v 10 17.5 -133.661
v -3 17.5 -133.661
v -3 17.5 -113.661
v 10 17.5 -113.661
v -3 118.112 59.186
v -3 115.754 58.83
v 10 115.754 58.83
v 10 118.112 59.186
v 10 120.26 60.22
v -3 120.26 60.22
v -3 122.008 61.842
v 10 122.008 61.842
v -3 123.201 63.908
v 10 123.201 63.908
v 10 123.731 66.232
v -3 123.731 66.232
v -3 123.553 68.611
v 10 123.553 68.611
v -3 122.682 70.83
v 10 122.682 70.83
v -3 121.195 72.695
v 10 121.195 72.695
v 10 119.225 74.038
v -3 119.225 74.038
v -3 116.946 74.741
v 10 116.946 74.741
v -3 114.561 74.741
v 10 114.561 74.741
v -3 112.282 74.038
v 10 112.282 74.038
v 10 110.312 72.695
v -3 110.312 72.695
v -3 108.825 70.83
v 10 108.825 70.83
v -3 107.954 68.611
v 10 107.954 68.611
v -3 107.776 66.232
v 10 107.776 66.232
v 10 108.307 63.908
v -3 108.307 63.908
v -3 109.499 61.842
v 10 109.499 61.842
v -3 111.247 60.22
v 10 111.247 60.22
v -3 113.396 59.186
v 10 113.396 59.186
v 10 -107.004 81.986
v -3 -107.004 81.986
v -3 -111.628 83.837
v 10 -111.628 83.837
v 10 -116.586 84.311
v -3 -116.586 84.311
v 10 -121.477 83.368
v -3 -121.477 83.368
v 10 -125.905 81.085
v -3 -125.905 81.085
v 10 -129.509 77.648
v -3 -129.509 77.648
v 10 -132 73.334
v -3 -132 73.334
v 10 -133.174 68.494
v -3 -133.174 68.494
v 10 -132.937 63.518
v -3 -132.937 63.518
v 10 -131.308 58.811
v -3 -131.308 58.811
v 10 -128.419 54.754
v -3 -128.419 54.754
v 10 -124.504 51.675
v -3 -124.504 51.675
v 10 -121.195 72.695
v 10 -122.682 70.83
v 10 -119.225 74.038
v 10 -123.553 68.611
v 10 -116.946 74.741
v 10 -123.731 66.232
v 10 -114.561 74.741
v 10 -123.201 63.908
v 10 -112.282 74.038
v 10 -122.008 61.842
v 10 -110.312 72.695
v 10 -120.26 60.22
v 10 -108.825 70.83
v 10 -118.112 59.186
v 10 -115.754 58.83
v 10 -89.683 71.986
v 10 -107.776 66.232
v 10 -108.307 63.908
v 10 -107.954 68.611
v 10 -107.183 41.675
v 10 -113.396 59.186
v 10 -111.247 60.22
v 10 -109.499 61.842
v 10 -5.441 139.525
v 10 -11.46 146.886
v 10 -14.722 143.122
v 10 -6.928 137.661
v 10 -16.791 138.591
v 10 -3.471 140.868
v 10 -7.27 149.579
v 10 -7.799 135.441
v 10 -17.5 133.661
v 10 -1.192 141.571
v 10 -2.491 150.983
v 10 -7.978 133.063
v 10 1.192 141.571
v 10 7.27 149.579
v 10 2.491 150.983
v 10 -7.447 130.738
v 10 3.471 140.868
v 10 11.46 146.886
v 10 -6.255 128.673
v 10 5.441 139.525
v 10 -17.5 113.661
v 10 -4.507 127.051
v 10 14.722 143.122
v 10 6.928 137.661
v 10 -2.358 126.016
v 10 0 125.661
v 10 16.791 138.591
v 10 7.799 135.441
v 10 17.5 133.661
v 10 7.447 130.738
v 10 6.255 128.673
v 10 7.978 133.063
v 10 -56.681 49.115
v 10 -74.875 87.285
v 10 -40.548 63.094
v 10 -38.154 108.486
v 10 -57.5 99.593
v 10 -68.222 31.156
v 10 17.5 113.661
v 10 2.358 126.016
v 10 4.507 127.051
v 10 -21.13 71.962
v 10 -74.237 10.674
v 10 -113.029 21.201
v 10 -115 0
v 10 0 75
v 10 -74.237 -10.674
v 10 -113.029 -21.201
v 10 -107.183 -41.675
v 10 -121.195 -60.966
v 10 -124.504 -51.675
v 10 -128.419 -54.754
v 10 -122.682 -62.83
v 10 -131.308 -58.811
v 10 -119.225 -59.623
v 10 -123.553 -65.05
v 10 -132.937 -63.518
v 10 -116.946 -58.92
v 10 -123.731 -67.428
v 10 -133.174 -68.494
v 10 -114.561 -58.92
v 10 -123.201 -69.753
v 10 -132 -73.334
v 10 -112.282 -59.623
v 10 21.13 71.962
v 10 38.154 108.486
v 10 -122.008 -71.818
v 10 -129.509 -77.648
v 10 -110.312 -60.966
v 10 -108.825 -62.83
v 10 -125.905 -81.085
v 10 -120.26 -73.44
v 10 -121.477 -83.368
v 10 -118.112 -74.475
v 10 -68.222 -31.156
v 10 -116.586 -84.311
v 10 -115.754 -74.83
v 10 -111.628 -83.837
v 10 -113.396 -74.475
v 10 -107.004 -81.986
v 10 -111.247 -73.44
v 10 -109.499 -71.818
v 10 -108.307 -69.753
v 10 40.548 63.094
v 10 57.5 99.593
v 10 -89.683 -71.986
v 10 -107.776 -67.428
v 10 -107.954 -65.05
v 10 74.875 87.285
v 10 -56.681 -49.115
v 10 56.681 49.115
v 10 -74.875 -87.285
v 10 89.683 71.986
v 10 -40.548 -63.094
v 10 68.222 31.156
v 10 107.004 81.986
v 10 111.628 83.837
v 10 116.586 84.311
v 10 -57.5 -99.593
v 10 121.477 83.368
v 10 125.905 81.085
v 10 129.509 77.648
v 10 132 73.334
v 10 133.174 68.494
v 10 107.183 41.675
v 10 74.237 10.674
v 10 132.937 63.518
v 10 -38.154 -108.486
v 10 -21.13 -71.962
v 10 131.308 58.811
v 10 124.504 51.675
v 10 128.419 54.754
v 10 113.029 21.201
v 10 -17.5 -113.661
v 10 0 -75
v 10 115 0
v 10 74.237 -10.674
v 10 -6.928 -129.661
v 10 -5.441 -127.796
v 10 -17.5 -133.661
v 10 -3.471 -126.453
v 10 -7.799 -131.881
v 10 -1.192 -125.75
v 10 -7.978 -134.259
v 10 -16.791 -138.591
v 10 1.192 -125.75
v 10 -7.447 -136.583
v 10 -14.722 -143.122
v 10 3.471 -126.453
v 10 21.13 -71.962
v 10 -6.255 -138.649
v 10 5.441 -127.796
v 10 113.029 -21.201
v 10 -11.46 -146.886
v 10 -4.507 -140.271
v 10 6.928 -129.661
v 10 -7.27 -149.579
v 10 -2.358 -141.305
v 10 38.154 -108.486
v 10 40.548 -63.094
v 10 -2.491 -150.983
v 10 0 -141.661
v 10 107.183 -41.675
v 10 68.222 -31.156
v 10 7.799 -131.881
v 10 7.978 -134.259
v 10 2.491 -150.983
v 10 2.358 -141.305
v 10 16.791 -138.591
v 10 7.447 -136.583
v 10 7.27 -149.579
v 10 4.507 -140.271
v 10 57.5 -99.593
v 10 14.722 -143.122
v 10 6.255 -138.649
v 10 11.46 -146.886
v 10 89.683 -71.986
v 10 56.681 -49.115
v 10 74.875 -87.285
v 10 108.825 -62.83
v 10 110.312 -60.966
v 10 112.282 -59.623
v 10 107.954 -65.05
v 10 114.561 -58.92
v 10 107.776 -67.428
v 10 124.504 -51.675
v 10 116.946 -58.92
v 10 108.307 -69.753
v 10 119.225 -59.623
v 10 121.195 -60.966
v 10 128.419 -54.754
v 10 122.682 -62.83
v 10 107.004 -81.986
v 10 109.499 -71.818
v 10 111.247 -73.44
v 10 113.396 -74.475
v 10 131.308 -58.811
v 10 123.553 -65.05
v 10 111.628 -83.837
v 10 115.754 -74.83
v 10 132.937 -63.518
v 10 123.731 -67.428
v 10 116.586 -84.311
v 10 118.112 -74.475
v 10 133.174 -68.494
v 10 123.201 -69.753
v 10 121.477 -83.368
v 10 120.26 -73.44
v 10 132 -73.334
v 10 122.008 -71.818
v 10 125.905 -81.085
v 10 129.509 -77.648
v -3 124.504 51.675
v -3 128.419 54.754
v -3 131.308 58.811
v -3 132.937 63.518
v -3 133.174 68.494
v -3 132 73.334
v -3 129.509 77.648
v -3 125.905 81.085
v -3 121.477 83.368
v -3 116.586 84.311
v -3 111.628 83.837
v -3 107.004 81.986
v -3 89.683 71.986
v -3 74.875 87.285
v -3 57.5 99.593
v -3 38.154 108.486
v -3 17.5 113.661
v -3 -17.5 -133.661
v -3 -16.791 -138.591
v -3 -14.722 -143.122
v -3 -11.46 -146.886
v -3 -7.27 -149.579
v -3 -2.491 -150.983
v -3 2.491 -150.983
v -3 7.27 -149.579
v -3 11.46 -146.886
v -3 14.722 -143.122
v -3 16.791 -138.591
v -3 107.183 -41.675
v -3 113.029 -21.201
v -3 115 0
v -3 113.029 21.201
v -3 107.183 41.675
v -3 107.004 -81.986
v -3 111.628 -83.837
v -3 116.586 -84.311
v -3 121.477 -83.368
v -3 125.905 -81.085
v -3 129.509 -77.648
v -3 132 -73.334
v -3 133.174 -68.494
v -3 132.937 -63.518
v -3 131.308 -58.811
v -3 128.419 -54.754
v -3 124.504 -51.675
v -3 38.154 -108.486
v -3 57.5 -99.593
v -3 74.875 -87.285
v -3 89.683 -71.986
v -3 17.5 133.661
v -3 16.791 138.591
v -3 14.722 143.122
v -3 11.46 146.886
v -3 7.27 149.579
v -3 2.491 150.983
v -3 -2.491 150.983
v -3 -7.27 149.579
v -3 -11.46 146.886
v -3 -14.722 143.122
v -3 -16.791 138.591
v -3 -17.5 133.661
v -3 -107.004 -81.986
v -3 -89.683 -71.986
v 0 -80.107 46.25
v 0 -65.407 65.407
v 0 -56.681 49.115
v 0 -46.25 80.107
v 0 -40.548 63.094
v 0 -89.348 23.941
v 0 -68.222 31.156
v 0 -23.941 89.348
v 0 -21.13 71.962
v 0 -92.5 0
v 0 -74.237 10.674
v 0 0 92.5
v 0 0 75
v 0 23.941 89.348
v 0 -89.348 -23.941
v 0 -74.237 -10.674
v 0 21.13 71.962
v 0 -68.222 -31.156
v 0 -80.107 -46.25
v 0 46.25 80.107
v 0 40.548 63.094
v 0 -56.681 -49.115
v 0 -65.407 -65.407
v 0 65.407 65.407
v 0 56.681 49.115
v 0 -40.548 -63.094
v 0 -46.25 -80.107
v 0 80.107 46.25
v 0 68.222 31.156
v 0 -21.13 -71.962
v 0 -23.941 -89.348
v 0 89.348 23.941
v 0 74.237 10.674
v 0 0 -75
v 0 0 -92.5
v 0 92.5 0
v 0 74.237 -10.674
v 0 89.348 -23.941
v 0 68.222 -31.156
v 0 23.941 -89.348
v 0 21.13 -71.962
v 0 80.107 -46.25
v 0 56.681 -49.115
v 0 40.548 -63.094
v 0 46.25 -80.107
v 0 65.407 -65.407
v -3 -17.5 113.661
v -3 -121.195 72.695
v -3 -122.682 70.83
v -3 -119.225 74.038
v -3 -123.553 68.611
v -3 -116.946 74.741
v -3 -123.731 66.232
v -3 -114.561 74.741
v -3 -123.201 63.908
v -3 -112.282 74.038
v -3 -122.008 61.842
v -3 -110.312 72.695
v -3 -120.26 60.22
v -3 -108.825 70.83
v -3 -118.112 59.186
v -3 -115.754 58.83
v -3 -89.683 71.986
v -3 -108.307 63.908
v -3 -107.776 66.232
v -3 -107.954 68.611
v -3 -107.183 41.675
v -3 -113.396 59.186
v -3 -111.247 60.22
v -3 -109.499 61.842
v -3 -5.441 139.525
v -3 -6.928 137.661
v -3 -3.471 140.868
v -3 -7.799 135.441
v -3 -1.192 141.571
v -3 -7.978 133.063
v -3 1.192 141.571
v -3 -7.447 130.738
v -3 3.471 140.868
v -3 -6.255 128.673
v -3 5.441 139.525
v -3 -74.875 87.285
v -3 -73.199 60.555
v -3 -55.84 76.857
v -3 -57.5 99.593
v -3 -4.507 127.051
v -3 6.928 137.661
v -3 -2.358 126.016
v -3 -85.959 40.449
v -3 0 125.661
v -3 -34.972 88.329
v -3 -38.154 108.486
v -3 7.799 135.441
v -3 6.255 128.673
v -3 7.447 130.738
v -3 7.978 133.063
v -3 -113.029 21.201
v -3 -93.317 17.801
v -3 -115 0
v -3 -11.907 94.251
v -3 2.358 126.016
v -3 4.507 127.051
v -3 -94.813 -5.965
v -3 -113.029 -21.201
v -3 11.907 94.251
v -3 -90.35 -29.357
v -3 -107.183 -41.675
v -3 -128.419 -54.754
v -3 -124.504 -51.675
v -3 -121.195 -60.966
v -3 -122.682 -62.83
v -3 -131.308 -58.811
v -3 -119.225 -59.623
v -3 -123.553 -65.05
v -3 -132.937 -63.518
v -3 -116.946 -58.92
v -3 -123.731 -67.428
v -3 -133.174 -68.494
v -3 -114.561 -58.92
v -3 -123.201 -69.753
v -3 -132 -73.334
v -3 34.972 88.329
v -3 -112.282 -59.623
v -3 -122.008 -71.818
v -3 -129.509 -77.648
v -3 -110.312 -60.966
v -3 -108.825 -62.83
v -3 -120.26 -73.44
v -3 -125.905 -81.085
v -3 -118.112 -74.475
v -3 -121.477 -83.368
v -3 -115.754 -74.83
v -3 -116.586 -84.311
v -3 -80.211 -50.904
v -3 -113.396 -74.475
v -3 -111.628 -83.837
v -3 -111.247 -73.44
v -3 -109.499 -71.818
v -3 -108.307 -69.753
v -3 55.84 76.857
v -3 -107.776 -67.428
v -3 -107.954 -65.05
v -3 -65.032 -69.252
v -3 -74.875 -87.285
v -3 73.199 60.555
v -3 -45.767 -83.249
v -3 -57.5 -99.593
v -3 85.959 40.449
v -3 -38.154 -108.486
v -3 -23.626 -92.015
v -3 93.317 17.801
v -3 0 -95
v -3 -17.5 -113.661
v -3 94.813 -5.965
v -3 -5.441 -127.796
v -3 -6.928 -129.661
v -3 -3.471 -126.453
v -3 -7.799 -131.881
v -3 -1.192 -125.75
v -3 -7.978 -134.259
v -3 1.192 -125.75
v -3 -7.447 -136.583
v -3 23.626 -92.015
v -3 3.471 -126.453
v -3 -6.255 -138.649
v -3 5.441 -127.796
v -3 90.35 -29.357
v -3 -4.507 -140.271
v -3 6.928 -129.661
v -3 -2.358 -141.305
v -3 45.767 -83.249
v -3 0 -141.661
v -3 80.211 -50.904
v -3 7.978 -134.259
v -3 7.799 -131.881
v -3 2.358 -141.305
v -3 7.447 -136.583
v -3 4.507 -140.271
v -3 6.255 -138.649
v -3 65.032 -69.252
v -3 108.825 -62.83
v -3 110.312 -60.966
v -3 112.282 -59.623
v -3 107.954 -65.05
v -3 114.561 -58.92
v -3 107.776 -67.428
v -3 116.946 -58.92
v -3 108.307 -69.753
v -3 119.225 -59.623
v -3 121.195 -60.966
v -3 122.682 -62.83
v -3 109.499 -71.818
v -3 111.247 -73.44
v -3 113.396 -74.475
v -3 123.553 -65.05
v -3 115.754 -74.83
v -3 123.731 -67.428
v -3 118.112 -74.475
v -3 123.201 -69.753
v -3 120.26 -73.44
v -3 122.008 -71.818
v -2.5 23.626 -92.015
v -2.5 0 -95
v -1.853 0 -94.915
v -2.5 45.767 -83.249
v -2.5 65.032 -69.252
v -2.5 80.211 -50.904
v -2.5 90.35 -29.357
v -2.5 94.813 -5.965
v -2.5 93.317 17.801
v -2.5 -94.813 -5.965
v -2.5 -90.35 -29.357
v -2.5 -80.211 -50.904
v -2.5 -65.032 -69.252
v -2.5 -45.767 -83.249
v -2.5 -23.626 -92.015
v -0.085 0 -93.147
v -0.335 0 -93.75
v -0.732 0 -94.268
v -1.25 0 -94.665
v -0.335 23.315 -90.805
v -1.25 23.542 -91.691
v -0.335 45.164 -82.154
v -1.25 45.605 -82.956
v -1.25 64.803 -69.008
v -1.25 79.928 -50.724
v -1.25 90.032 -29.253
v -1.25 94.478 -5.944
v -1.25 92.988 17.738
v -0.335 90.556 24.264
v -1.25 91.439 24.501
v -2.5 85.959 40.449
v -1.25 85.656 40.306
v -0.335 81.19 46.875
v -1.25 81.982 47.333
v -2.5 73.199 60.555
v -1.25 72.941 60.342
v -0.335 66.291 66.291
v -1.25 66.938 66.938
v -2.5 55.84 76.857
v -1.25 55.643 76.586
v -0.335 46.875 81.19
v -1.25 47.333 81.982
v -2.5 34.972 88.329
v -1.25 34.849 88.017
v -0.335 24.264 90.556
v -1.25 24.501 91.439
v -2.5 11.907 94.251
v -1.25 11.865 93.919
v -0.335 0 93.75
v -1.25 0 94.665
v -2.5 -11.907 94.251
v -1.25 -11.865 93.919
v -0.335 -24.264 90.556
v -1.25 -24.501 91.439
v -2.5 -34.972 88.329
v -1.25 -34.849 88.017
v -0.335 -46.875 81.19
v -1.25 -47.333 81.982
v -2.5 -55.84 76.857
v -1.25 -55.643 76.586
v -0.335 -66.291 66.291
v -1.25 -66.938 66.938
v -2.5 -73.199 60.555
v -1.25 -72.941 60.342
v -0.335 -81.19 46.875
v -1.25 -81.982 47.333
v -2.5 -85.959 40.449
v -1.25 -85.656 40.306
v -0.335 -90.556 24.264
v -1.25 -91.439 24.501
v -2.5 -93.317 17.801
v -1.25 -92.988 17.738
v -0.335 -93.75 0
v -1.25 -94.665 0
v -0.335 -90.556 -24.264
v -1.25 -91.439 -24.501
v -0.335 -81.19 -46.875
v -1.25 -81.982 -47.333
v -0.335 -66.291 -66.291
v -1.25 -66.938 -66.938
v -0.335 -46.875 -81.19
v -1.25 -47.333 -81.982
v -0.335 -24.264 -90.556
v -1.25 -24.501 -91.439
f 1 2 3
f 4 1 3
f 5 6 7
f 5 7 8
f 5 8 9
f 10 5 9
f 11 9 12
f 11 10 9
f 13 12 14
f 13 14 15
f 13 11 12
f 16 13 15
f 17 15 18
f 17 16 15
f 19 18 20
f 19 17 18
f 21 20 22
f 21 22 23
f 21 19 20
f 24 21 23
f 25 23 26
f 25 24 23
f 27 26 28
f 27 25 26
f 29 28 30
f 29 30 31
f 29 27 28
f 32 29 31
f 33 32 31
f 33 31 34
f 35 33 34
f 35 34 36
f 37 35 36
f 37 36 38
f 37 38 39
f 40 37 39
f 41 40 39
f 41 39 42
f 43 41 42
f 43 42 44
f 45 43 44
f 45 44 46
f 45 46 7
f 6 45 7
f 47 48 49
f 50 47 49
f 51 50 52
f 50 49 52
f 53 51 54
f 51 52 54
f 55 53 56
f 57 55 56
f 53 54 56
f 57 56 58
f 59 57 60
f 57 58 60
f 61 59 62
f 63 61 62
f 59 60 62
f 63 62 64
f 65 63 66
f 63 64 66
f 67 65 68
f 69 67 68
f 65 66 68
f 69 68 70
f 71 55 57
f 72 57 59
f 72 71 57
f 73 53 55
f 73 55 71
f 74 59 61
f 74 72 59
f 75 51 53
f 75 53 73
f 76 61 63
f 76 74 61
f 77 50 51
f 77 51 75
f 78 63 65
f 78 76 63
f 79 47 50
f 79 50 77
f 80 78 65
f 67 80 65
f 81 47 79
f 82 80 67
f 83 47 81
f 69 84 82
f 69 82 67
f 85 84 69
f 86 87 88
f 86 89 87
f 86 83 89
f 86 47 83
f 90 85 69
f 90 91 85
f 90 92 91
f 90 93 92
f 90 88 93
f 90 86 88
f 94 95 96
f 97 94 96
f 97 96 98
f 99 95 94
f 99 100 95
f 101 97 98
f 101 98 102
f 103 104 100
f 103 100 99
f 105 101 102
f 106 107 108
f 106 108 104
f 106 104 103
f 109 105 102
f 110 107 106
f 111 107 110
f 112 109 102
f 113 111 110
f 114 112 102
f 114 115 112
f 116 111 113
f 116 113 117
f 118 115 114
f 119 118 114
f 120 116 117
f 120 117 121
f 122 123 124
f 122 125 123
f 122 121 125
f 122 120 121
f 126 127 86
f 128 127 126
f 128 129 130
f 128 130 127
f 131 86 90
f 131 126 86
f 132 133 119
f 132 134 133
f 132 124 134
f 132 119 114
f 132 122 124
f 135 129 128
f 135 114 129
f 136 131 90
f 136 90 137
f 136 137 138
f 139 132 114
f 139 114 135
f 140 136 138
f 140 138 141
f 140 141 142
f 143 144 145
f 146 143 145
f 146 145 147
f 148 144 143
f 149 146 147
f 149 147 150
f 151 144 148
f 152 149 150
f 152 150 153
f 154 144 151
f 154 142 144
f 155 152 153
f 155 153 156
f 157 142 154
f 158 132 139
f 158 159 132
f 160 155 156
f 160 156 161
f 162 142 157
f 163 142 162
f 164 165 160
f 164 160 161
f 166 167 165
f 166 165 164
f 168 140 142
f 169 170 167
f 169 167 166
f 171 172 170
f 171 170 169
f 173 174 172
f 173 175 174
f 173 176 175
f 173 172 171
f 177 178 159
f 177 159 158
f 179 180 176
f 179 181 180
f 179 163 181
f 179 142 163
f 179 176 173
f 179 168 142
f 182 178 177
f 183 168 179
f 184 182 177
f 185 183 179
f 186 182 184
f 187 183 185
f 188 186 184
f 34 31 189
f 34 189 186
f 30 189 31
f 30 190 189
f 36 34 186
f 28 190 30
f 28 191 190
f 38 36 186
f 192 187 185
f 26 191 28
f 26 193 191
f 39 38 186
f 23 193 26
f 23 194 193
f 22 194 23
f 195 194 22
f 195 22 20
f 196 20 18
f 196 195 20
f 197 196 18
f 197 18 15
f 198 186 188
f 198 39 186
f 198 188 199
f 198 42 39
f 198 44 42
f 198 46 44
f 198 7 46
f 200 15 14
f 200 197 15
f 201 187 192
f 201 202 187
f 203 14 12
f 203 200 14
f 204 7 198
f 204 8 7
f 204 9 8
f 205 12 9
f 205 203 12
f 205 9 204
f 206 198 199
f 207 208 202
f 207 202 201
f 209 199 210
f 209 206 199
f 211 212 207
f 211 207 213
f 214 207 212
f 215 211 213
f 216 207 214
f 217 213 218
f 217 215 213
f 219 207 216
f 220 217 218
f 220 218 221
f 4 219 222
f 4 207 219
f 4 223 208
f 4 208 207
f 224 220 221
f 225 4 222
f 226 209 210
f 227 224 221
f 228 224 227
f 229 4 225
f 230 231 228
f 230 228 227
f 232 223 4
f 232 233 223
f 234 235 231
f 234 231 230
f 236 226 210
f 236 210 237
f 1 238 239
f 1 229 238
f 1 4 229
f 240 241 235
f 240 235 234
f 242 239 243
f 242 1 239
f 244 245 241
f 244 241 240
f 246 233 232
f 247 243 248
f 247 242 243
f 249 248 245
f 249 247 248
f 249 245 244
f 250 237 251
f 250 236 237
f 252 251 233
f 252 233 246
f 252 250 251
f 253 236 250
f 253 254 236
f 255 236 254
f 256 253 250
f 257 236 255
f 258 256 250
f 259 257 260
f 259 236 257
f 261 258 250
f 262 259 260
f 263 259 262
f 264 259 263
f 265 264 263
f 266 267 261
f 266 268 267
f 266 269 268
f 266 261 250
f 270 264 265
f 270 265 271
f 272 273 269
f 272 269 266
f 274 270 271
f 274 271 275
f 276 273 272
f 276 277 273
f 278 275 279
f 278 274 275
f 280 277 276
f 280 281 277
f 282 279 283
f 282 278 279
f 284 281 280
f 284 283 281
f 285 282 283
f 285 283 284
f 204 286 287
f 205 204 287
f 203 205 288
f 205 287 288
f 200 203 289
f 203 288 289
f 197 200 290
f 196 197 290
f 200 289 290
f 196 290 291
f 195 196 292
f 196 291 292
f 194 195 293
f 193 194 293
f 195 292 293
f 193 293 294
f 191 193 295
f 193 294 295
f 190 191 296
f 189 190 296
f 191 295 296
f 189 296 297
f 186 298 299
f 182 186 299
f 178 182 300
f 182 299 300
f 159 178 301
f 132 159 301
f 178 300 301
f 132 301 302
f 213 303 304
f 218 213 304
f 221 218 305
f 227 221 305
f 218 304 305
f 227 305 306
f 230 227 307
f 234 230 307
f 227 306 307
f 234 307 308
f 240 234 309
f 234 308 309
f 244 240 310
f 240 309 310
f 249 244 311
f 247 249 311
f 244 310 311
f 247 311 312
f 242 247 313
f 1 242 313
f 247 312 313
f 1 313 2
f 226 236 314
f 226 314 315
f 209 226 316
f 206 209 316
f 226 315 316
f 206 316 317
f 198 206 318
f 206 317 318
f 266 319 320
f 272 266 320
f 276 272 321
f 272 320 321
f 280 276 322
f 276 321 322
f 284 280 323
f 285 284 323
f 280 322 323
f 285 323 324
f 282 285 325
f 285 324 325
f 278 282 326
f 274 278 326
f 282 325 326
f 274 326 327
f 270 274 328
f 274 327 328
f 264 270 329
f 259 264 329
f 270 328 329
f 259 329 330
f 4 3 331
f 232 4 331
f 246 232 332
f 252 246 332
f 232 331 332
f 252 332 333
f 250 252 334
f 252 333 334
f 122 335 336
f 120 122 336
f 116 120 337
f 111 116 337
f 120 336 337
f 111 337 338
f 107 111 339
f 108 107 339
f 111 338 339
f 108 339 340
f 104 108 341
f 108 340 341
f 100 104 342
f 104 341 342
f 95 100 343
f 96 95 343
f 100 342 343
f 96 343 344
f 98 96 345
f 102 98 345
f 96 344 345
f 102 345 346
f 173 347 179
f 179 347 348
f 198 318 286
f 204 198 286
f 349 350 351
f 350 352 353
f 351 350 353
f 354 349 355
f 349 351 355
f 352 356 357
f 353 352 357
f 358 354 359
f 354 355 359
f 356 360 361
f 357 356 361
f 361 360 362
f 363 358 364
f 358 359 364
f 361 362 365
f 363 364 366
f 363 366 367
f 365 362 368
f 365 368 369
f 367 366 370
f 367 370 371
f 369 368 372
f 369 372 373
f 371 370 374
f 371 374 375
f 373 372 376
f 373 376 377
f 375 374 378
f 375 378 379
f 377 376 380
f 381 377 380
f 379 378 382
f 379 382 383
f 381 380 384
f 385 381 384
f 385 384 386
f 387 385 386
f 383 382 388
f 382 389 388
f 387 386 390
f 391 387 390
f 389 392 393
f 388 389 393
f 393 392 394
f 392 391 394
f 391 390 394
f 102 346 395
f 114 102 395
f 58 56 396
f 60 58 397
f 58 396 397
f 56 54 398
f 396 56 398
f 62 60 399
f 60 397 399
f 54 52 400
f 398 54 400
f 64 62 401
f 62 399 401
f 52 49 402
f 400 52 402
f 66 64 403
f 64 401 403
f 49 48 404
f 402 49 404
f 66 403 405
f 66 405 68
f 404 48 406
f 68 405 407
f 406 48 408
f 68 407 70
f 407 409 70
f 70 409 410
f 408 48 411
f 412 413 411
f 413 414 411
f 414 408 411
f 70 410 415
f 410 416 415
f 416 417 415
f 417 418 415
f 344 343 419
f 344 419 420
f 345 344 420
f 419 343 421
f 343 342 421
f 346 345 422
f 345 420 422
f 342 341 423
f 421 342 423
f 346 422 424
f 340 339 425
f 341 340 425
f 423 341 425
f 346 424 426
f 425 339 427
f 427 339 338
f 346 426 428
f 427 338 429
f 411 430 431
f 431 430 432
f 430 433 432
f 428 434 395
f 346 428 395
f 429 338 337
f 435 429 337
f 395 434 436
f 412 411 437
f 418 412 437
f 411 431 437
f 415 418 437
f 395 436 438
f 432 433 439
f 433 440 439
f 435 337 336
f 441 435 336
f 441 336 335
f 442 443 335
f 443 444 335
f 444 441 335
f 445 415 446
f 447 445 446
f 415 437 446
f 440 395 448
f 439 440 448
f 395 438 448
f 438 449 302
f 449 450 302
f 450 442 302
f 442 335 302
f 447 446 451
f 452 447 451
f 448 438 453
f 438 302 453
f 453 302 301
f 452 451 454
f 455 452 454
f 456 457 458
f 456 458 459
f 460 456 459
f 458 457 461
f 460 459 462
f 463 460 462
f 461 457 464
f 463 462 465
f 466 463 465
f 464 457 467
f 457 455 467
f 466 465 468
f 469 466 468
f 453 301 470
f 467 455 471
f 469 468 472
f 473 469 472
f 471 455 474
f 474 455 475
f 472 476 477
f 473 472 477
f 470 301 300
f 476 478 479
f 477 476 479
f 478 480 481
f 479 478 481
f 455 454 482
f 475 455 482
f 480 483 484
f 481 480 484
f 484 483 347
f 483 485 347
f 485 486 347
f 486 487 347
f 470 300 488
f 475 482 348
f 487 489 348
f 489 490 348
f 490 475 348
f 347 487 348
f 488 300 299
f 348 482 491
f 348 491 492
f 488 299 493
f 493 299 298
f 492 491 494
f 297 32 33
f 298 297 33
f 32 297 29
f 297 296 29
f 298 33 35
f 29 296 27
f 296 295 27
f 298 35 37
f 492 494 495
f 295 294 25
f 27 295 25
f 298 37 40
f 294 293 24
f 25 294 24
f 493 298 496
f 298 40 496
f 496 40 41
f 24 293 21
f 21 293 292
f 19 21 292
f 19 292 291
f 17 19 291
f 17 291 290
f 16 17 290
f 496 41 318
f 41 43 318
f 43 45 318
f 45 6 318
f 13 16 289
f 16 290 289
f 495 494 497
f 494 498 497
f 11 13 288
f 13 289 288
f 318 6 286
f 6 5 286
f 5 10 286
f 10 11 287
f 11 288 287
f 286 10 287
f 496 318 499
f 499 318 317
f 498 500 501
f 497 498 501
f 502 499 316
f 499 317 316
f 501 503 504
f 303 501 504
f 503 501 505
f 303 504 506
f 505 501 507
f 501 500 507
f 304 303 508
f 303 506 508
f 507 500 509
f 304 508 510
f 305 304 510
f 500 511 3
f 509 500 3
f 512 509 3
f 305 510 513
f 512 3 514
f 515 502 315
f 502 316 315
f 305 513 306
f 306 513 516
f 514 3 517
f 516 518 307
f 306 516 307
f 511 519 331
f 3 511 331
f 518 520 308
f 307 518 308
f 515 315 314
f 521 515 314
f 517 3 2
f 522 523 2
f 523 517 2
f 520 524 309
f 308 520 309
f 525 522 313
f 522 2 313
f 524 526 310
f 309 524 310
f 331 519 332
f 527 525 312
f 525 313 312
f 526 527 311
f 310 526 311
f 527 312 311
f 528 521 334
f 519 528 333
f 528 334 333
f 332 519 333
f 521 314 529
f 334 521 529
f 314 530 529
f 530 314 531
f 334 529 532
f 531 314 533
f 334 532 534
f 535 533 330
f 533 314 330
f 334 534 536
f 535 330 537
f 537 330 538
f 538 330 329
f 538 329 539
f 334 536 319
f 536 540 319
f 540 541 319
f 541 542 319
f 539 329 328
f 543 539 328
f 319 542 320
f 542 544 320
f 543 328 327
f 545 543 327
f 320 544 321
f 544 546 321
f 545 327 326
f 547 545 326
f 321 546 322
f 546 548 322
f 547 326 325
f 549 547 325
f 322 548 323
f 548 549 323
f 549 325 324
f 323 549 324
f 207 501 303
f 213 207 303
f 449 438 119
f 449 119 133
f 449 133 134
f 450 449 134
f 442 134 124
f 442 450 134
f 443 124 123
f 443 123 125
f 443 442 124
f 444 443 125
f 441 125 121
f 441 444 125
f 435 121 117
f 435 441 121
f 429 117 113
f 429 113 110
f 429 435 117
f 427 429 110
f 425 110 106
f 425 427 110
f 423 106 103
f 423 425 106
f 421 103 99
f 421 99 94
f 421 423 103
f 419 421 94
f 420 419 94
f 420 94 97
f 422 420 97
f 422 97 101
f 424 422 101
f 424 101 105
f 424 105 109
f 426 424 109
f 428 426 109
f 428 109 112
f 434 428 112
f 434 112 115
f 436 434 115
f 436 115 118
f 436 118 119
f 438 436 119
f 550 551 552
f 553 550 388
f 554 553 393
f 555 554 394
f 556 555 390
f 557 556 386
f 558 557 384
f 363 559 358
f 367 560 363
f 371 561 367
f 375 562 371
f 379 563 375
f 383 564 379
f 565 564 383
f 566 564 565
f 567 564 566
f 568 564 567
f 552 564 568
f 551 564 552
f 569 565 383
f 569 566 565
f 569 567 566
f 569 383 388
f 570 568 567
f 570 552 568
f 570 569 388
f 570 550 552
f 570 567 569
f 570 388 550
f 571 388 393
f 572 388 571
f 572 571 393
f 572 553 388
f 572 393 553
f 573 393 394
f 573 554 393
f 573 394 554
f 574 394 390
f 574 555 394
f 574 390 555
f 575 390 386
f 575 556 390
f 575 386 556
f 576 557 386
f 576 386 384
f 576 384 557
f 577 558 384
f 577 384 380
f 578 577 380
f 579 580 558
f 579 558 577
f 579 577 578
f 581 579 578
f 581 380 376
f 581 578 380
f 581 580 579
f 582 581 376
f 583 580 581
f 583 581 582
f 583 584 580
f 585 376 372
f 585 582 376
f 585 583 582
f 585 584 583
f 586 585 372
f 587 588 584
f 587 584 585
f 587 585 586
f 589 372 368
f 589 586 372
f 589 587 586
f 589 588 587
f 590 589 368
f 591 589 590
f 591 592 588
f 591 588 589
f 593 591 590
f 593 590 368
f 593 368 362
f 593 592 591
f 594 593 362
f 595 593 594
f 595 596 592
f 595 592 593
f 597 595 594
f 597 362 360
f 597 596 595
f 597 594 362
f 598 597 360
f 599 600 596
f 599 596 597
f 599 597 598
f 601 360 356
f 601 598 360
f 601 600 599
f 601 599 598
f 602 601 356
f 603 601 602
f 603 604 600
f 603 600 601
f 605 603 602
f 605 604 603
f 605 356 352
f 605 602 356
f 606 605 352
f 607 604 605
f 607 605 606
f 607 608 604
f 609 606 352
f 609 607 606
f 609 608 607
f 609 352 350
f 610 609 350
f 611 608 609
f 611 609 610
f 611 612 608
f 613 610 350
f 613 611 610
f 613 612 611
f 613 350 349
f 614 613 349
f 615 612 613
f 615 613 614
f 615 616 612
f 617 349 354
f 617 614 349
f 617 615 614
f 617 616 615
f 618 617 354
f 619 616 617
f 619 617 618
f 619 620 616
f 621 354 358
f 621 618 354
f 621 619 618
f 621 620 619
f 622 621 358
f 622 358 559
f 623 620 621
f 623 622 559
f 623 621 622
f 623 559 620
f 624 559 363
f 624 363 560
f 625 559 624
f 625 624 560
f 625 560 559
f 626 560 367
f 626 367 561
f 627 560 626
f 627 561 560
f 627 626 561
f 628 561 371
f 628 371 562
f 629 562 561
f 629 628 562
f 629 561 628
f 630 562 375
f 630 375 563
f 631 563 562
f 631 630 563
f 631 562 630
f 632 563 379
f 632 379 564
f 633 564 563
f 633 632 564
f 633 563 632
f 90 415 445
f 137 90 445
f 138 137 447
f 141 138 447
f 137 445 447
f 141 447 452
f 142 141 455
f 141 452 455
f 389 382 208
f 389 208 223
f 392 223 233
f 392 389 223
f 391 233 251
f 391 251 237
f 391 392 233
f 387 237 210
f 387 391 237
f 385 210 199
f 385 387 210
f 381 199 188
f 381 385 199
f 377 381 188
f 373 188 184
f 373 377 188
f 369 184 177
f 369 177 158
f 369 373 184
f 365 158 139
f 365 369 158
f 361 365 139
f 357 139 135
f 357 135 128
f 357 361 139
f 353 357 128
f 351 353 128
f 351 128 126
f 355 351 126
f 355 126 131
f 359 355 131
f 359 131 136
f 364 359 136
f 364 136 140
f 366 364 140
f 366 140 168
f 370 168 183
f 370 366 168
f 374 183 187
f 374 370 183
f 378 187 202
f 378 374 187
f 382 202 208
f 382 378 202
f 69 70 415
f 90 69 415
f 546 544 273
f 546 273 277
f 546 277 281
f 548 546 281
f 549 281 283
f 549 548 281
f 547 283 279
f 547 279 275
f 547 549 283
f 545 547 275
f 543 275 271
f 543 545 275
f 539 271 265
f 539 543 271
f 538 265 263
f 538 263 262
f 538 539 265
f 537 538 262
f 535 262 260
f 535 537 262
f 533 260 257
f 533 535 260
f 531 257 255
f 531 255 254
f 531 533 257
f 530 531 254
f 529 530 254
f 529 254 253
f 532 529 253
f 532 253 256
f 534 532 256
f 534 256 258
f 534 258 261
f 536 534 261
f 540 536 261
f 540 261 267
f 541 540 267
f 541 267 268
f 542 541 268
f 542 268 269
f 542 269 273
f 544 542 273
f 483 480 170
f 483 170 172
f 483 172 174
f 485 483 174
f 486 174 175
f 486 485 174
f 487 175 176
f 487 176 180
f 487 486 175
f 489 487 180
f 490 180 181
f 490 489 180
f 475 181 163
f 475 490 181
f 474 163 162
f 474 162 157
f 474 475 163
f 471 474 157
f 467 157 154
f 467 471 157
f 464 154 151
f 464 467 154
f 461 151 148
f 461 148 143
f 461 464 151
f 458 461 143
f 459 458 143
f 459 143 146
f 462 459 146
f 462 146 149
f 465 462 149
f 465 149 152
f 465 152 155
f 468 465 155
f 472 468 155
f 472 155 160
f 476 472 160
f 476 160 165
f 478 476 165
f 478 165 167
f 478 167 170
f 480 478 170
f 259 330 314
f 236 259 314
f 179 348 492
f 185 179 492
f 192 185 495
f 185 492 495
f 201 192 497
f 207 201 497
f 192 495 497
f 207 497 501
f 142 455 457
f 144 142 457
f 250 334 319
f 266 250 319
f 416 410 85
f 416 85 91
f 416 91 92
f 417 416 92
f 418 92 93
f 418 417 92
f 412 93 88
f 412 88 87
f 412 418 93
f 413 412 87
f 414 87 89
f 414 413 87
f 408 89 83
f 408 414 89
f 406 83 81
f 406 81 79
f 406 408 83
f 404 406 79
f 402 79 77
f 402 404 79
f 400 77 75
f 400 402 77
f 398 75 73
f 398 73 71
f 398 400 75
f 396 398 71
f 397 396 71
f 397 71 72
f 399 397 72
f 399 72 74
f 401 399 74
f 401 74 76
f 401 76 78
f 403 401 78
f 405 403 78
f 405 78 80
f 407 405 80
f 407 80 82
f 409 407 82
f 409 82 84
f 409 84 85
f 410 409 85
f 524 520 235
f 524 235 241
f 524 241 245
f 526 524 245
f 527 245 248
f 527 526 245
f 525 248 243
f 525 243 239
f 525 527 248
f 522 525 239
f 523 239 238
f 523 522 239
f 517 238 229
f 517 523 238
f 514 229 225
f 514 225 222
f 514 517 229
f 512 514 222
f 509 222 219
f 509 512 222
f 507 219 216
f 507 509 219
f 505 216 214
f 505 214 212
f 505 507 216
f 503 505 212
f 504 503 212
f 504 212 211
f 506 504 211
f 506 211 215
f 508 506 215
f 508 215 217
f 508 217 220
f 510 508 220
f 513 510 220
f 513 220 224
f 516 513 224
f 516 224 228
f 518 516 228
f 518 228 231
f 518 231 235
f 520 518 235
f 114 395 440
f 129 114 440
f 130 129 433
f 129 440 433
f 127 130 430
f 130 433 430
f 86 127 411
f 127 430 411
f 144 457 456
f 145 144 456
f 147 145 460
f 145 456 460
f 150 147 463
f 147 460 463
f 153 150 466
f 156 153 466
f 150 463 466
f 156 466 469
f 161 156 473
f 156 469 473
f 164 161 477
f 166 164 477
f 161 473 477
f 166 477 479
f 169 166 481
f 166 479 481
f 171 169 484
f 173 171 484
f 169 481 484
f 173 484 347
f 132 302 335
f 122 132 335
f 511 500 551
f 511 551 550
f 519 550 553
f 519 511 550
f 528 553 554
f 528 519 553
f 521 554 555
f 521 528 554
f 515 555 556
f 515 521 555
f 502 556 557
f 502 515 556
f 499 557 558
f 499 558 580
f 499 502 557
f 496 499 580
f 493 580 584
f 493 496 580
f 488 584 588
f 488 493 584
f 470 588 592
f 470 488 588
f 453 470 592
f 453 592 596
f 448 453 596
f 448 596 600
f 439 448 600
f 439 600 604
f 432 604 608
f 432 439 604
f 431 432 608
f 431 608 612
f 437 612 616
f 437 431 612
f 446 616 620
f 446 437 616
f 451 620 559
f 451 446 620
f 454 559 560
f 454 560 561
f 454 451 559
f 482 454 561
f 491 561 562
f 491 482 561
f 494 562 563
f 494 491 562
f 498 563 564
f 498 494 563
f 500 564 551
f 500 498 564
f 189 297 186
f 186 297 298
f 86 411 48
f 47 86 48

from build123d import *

# Parameters (mm, degrees)
SKETCH2_R           = 8
SKETCH2_R_2         = 75
BOSS_EXTRUDE1_DEPTH = 10
BOSS_EXTRUDE2_START = -3
SKETCH2_5_R         = 8
SKETCH2_5_R_2       = 95
BOSS_EXTRUDE2_DEPTH = 3
FILLET1_R           = 2.5


with BuildPart() as part:
    # Sketch2 → Boss-Extrude1 (new body)
    with BuildSketch(Plane(origin=(0, 0, 0), x_dir=(0, 0, -1), z_dir=(1, 0, 0))):
        with BuildLine():
            Line((133.660679217, 17.5), (113.660679217, 17.5))
            ThreePointArc((113.660679217, 17.5), (99.592921435, 57.5), (71.985784175, 89.683035613))
            Line((71.985784175, 89.683035613), (81.985784175, 107.003543689))
            ThreePointArc((81.985784175, 107.003543689), (75.580339608, 130.908988255), (51.674895042, 124.503543689))
            Line((51.674895042, 124.503543689), (41.674895042, 107.183035613))
            ThreePointArc((41.674895042, 107.183035613), (0, 115), (-41.674895042, 107.183035613))
            Line((-41.674895042, 107.183035613), (-51.674895042, 124.503543689))
            ThreePointArc((-51.674895042, 124.503543689), (-75.580339608, 130.908988255), (-81.985784175, 107.003543689))
            Line((-81.985784175, 107.003543689), (-71.985784175, 89.683035613))
            ThreePointArc((-71.985784175, 89.683035613), (-99.592921435, 57.5), (-113.660679217, 17.5))
            Line((-113.660679217, 17.5), (-133.660679217, 17.5))
            ThreePointArc((-133.660679217, 17.5), (-151.160679217, 0), (-133.660679217, -17.5))
            Line((-133.660679217, -17.5), (-113.660679217, -17.5))
            ThreePointArc((-113.660679217, -17.5), (-99.592921435, -57.5), (-71.985784175, -89.683035613))
            Line((-71.985784175, -89.683035613), (-81.985784175, -107.003543689))
            ThreePointArc((-81.985784175, -107.003543689), (-75.580339608, -130.908988255), (-51.674895042, -124.503543689))
            Line((-51.674895042, -124.503543689), (-41.674895042, -107.183035613))
            ThreePointArc((-41.674895042, -107.183035613), (0, -115), (41.674895042, -107.183035613))
            Line((41.674895042, -107.183035613), (51.674895042, -124.503543689))
            ThreePointArc((51.674895042, -124.503543689), (75.580339608, -130.908988255), (81.985784175, -107.003543689))
            Line((81.985784175, -107.003543689), (71.985784175, -89.683035613))
            ThreePointArc((71.985784175, -89.683035613), (99.592921435, -57.5), (113.660679217, -17.5))
            Line((113.660679217, -17.5), (133.660679217, -17.5))
            ThreePointArc((133.660679217, -17.5), (151.160679217, 0), (133.660679217, 17.5))
        make_face()
        with Locations((133.660679217, 0)):
            Circle(SKETCH2_R, mode=Mode.SUBTRACT)
        Circle(SKETCH2_R_2, mode=Mode.SUBTRACT)
        with Locations((66.830339608, -115.753543689)):
            Circle(SKETCH2_R, mode=Mode.SUBTRACT)
        with Locations((-66.830339608, -115.753543689)):
            Circle(SKETCH2_R, mode=Mode.SUBTRACT)
        with Locations((-133.660679217, 0)):
            Circle(SKETCH2_R, mode=Mode.SUBTRACT)
        with Locations((-66.830339608, 115.753543689)):
            Circle(SKETCH2_R, mode=Mode.SUBTRACT)
        with Locations((66.830339608, 115.753543689)):
            Circle(SKETCH2_R, mode=Mode.SUBTRACT)
    extrude(amount=BOSS_EXTRUDE1_DEPTH)

    # Sketch2<5> → Boss-Extrude2 (add)
    with BuildSketch(Plane(origin=(0, 0, 0), x_dir=(0, 0, -1), z_dir=(1, 0, 0)).offset(BOSS_EXTRUDE2_START)):
        with BuildLine():
            Line((133.660679217, 17.5), (113.660679217, 17.5))
            ThreePointArc((113.660679217, 17.5), (99.592921435, 57.5), (71.985784175, 89.683035613))
            Line((71.985784175, 89.683035613), (81.985784175, 107.003543689))
            ThreePointArc((81.985784175, 107.003543689), (75.580339608, 130.908988255), (51.674895042, 124.503543689))
            Line((51.674895042, 124.503543689), (41.674895042, 107.183035613))
            ThreePointArc((41.674895042, 107.183035613), (0, 115), (-41.674895042, 107.183035613))
            Line((-41.674895042, 107.183035613), (-51.674895042, 124.503543689))
            ThreePointArc((-51.674895042, 124.503543689), (-75.580339608, 130.908988255), (-81.985784175, 107.003543689))
            Line((-81.985784175, 107.003543689), (-71.985784175, 89.683035613))
            ThreePointArc((-71.985784175, 89.683035613), (-99.592921435, 57.5), (-113.660679217, 17.5))
            Line((-113.660679217, 17.5), (-133.660679217, 17.5))
            ThreePointArc((-133.660679217, 17.5), (-151.160679217, 0), (-133.660679217, -17.5))
            Line((-133.660679217, -17.5), (-113.660679217, -17.5))
            ThreePointArc((-113.660679217, -17.5), (-99.592921435, -57.5), (-71.985784175, -89.683035613))
            Line((-71.985784175, -89.683035613), (-81.985784175, -107.003543689))
            ThreePointArc((-81.985784175, -107.003543689), (-75.580339608, -130.908988255), (-51.674895042, -124.503543689))
            Line((-51.674895042, -124.503543689), (-41.674895042, -107.183035613))
            ThreePointArc((-41.674895042, -107.183035613), (0, -115), (41.674895042, -107.183035613))
            Line((41.674895042, -107.183035613), (51.674895042, -124.503543689))
            ThreePointArc((51.674895042, -124.503543689), (75.580339608, -130.908988255), (81.985784175, -107.003543689))
            Line((81.985784175, -107.003543689), (71.985784175, -89.683035613))
            ThreePointArc((71.985784175, -89.683035613), (99.592921435, -57.5), (113.660679217, -17.5))
            Line((113.660679217, -17.5), (133.660679217, -17.5))
            ThreePointArc((133.660679217, -17.5), (151.160679217, 0), (133.660679217, 17.5))
        make_face()
        with Locations((133.660679217, 0)):
            Circle(SKETCH2_5_R, mode=Mode.SUBTRACT)
        Circle(SKETCH2_5_R_2, mode=Mode.SUBTRACT)
        with Locations((66.830339608, -115.753543689)):
            Circle(SKETCH2_5_R, mode=Mode.SUBTRACT)
        with Locations((-66.830339608, -115.753543689)):
            Circle(SKETCH2_5_R, mode=Mode.SUBTRACT)
        with Locations((-133.660679217, 0)):
            Circle(SKETCH2_5_R, mode=Mode.SUBTRACT)
        with Locations((-66.830339608, 115.753543689)):
            Circle(SKETCH2_5_R, mode=Mode.SUBTRACT)
        with Locations((66.830339608, 115.753543689)):
            Circle(SKETCH2_5_R, mode=Mode.SUBTRACT)
    extrude(amount=BOSS_EXTRUDE2_DEPTH)

    # Fillet1
    fillet1_edges = [part.edges().sort_by_distance(p)[0] for p in [
        (0, 0, 95),
    ]]
    fillet(fillet1_edges, radius=FILLET1_R)


solid = part.part
